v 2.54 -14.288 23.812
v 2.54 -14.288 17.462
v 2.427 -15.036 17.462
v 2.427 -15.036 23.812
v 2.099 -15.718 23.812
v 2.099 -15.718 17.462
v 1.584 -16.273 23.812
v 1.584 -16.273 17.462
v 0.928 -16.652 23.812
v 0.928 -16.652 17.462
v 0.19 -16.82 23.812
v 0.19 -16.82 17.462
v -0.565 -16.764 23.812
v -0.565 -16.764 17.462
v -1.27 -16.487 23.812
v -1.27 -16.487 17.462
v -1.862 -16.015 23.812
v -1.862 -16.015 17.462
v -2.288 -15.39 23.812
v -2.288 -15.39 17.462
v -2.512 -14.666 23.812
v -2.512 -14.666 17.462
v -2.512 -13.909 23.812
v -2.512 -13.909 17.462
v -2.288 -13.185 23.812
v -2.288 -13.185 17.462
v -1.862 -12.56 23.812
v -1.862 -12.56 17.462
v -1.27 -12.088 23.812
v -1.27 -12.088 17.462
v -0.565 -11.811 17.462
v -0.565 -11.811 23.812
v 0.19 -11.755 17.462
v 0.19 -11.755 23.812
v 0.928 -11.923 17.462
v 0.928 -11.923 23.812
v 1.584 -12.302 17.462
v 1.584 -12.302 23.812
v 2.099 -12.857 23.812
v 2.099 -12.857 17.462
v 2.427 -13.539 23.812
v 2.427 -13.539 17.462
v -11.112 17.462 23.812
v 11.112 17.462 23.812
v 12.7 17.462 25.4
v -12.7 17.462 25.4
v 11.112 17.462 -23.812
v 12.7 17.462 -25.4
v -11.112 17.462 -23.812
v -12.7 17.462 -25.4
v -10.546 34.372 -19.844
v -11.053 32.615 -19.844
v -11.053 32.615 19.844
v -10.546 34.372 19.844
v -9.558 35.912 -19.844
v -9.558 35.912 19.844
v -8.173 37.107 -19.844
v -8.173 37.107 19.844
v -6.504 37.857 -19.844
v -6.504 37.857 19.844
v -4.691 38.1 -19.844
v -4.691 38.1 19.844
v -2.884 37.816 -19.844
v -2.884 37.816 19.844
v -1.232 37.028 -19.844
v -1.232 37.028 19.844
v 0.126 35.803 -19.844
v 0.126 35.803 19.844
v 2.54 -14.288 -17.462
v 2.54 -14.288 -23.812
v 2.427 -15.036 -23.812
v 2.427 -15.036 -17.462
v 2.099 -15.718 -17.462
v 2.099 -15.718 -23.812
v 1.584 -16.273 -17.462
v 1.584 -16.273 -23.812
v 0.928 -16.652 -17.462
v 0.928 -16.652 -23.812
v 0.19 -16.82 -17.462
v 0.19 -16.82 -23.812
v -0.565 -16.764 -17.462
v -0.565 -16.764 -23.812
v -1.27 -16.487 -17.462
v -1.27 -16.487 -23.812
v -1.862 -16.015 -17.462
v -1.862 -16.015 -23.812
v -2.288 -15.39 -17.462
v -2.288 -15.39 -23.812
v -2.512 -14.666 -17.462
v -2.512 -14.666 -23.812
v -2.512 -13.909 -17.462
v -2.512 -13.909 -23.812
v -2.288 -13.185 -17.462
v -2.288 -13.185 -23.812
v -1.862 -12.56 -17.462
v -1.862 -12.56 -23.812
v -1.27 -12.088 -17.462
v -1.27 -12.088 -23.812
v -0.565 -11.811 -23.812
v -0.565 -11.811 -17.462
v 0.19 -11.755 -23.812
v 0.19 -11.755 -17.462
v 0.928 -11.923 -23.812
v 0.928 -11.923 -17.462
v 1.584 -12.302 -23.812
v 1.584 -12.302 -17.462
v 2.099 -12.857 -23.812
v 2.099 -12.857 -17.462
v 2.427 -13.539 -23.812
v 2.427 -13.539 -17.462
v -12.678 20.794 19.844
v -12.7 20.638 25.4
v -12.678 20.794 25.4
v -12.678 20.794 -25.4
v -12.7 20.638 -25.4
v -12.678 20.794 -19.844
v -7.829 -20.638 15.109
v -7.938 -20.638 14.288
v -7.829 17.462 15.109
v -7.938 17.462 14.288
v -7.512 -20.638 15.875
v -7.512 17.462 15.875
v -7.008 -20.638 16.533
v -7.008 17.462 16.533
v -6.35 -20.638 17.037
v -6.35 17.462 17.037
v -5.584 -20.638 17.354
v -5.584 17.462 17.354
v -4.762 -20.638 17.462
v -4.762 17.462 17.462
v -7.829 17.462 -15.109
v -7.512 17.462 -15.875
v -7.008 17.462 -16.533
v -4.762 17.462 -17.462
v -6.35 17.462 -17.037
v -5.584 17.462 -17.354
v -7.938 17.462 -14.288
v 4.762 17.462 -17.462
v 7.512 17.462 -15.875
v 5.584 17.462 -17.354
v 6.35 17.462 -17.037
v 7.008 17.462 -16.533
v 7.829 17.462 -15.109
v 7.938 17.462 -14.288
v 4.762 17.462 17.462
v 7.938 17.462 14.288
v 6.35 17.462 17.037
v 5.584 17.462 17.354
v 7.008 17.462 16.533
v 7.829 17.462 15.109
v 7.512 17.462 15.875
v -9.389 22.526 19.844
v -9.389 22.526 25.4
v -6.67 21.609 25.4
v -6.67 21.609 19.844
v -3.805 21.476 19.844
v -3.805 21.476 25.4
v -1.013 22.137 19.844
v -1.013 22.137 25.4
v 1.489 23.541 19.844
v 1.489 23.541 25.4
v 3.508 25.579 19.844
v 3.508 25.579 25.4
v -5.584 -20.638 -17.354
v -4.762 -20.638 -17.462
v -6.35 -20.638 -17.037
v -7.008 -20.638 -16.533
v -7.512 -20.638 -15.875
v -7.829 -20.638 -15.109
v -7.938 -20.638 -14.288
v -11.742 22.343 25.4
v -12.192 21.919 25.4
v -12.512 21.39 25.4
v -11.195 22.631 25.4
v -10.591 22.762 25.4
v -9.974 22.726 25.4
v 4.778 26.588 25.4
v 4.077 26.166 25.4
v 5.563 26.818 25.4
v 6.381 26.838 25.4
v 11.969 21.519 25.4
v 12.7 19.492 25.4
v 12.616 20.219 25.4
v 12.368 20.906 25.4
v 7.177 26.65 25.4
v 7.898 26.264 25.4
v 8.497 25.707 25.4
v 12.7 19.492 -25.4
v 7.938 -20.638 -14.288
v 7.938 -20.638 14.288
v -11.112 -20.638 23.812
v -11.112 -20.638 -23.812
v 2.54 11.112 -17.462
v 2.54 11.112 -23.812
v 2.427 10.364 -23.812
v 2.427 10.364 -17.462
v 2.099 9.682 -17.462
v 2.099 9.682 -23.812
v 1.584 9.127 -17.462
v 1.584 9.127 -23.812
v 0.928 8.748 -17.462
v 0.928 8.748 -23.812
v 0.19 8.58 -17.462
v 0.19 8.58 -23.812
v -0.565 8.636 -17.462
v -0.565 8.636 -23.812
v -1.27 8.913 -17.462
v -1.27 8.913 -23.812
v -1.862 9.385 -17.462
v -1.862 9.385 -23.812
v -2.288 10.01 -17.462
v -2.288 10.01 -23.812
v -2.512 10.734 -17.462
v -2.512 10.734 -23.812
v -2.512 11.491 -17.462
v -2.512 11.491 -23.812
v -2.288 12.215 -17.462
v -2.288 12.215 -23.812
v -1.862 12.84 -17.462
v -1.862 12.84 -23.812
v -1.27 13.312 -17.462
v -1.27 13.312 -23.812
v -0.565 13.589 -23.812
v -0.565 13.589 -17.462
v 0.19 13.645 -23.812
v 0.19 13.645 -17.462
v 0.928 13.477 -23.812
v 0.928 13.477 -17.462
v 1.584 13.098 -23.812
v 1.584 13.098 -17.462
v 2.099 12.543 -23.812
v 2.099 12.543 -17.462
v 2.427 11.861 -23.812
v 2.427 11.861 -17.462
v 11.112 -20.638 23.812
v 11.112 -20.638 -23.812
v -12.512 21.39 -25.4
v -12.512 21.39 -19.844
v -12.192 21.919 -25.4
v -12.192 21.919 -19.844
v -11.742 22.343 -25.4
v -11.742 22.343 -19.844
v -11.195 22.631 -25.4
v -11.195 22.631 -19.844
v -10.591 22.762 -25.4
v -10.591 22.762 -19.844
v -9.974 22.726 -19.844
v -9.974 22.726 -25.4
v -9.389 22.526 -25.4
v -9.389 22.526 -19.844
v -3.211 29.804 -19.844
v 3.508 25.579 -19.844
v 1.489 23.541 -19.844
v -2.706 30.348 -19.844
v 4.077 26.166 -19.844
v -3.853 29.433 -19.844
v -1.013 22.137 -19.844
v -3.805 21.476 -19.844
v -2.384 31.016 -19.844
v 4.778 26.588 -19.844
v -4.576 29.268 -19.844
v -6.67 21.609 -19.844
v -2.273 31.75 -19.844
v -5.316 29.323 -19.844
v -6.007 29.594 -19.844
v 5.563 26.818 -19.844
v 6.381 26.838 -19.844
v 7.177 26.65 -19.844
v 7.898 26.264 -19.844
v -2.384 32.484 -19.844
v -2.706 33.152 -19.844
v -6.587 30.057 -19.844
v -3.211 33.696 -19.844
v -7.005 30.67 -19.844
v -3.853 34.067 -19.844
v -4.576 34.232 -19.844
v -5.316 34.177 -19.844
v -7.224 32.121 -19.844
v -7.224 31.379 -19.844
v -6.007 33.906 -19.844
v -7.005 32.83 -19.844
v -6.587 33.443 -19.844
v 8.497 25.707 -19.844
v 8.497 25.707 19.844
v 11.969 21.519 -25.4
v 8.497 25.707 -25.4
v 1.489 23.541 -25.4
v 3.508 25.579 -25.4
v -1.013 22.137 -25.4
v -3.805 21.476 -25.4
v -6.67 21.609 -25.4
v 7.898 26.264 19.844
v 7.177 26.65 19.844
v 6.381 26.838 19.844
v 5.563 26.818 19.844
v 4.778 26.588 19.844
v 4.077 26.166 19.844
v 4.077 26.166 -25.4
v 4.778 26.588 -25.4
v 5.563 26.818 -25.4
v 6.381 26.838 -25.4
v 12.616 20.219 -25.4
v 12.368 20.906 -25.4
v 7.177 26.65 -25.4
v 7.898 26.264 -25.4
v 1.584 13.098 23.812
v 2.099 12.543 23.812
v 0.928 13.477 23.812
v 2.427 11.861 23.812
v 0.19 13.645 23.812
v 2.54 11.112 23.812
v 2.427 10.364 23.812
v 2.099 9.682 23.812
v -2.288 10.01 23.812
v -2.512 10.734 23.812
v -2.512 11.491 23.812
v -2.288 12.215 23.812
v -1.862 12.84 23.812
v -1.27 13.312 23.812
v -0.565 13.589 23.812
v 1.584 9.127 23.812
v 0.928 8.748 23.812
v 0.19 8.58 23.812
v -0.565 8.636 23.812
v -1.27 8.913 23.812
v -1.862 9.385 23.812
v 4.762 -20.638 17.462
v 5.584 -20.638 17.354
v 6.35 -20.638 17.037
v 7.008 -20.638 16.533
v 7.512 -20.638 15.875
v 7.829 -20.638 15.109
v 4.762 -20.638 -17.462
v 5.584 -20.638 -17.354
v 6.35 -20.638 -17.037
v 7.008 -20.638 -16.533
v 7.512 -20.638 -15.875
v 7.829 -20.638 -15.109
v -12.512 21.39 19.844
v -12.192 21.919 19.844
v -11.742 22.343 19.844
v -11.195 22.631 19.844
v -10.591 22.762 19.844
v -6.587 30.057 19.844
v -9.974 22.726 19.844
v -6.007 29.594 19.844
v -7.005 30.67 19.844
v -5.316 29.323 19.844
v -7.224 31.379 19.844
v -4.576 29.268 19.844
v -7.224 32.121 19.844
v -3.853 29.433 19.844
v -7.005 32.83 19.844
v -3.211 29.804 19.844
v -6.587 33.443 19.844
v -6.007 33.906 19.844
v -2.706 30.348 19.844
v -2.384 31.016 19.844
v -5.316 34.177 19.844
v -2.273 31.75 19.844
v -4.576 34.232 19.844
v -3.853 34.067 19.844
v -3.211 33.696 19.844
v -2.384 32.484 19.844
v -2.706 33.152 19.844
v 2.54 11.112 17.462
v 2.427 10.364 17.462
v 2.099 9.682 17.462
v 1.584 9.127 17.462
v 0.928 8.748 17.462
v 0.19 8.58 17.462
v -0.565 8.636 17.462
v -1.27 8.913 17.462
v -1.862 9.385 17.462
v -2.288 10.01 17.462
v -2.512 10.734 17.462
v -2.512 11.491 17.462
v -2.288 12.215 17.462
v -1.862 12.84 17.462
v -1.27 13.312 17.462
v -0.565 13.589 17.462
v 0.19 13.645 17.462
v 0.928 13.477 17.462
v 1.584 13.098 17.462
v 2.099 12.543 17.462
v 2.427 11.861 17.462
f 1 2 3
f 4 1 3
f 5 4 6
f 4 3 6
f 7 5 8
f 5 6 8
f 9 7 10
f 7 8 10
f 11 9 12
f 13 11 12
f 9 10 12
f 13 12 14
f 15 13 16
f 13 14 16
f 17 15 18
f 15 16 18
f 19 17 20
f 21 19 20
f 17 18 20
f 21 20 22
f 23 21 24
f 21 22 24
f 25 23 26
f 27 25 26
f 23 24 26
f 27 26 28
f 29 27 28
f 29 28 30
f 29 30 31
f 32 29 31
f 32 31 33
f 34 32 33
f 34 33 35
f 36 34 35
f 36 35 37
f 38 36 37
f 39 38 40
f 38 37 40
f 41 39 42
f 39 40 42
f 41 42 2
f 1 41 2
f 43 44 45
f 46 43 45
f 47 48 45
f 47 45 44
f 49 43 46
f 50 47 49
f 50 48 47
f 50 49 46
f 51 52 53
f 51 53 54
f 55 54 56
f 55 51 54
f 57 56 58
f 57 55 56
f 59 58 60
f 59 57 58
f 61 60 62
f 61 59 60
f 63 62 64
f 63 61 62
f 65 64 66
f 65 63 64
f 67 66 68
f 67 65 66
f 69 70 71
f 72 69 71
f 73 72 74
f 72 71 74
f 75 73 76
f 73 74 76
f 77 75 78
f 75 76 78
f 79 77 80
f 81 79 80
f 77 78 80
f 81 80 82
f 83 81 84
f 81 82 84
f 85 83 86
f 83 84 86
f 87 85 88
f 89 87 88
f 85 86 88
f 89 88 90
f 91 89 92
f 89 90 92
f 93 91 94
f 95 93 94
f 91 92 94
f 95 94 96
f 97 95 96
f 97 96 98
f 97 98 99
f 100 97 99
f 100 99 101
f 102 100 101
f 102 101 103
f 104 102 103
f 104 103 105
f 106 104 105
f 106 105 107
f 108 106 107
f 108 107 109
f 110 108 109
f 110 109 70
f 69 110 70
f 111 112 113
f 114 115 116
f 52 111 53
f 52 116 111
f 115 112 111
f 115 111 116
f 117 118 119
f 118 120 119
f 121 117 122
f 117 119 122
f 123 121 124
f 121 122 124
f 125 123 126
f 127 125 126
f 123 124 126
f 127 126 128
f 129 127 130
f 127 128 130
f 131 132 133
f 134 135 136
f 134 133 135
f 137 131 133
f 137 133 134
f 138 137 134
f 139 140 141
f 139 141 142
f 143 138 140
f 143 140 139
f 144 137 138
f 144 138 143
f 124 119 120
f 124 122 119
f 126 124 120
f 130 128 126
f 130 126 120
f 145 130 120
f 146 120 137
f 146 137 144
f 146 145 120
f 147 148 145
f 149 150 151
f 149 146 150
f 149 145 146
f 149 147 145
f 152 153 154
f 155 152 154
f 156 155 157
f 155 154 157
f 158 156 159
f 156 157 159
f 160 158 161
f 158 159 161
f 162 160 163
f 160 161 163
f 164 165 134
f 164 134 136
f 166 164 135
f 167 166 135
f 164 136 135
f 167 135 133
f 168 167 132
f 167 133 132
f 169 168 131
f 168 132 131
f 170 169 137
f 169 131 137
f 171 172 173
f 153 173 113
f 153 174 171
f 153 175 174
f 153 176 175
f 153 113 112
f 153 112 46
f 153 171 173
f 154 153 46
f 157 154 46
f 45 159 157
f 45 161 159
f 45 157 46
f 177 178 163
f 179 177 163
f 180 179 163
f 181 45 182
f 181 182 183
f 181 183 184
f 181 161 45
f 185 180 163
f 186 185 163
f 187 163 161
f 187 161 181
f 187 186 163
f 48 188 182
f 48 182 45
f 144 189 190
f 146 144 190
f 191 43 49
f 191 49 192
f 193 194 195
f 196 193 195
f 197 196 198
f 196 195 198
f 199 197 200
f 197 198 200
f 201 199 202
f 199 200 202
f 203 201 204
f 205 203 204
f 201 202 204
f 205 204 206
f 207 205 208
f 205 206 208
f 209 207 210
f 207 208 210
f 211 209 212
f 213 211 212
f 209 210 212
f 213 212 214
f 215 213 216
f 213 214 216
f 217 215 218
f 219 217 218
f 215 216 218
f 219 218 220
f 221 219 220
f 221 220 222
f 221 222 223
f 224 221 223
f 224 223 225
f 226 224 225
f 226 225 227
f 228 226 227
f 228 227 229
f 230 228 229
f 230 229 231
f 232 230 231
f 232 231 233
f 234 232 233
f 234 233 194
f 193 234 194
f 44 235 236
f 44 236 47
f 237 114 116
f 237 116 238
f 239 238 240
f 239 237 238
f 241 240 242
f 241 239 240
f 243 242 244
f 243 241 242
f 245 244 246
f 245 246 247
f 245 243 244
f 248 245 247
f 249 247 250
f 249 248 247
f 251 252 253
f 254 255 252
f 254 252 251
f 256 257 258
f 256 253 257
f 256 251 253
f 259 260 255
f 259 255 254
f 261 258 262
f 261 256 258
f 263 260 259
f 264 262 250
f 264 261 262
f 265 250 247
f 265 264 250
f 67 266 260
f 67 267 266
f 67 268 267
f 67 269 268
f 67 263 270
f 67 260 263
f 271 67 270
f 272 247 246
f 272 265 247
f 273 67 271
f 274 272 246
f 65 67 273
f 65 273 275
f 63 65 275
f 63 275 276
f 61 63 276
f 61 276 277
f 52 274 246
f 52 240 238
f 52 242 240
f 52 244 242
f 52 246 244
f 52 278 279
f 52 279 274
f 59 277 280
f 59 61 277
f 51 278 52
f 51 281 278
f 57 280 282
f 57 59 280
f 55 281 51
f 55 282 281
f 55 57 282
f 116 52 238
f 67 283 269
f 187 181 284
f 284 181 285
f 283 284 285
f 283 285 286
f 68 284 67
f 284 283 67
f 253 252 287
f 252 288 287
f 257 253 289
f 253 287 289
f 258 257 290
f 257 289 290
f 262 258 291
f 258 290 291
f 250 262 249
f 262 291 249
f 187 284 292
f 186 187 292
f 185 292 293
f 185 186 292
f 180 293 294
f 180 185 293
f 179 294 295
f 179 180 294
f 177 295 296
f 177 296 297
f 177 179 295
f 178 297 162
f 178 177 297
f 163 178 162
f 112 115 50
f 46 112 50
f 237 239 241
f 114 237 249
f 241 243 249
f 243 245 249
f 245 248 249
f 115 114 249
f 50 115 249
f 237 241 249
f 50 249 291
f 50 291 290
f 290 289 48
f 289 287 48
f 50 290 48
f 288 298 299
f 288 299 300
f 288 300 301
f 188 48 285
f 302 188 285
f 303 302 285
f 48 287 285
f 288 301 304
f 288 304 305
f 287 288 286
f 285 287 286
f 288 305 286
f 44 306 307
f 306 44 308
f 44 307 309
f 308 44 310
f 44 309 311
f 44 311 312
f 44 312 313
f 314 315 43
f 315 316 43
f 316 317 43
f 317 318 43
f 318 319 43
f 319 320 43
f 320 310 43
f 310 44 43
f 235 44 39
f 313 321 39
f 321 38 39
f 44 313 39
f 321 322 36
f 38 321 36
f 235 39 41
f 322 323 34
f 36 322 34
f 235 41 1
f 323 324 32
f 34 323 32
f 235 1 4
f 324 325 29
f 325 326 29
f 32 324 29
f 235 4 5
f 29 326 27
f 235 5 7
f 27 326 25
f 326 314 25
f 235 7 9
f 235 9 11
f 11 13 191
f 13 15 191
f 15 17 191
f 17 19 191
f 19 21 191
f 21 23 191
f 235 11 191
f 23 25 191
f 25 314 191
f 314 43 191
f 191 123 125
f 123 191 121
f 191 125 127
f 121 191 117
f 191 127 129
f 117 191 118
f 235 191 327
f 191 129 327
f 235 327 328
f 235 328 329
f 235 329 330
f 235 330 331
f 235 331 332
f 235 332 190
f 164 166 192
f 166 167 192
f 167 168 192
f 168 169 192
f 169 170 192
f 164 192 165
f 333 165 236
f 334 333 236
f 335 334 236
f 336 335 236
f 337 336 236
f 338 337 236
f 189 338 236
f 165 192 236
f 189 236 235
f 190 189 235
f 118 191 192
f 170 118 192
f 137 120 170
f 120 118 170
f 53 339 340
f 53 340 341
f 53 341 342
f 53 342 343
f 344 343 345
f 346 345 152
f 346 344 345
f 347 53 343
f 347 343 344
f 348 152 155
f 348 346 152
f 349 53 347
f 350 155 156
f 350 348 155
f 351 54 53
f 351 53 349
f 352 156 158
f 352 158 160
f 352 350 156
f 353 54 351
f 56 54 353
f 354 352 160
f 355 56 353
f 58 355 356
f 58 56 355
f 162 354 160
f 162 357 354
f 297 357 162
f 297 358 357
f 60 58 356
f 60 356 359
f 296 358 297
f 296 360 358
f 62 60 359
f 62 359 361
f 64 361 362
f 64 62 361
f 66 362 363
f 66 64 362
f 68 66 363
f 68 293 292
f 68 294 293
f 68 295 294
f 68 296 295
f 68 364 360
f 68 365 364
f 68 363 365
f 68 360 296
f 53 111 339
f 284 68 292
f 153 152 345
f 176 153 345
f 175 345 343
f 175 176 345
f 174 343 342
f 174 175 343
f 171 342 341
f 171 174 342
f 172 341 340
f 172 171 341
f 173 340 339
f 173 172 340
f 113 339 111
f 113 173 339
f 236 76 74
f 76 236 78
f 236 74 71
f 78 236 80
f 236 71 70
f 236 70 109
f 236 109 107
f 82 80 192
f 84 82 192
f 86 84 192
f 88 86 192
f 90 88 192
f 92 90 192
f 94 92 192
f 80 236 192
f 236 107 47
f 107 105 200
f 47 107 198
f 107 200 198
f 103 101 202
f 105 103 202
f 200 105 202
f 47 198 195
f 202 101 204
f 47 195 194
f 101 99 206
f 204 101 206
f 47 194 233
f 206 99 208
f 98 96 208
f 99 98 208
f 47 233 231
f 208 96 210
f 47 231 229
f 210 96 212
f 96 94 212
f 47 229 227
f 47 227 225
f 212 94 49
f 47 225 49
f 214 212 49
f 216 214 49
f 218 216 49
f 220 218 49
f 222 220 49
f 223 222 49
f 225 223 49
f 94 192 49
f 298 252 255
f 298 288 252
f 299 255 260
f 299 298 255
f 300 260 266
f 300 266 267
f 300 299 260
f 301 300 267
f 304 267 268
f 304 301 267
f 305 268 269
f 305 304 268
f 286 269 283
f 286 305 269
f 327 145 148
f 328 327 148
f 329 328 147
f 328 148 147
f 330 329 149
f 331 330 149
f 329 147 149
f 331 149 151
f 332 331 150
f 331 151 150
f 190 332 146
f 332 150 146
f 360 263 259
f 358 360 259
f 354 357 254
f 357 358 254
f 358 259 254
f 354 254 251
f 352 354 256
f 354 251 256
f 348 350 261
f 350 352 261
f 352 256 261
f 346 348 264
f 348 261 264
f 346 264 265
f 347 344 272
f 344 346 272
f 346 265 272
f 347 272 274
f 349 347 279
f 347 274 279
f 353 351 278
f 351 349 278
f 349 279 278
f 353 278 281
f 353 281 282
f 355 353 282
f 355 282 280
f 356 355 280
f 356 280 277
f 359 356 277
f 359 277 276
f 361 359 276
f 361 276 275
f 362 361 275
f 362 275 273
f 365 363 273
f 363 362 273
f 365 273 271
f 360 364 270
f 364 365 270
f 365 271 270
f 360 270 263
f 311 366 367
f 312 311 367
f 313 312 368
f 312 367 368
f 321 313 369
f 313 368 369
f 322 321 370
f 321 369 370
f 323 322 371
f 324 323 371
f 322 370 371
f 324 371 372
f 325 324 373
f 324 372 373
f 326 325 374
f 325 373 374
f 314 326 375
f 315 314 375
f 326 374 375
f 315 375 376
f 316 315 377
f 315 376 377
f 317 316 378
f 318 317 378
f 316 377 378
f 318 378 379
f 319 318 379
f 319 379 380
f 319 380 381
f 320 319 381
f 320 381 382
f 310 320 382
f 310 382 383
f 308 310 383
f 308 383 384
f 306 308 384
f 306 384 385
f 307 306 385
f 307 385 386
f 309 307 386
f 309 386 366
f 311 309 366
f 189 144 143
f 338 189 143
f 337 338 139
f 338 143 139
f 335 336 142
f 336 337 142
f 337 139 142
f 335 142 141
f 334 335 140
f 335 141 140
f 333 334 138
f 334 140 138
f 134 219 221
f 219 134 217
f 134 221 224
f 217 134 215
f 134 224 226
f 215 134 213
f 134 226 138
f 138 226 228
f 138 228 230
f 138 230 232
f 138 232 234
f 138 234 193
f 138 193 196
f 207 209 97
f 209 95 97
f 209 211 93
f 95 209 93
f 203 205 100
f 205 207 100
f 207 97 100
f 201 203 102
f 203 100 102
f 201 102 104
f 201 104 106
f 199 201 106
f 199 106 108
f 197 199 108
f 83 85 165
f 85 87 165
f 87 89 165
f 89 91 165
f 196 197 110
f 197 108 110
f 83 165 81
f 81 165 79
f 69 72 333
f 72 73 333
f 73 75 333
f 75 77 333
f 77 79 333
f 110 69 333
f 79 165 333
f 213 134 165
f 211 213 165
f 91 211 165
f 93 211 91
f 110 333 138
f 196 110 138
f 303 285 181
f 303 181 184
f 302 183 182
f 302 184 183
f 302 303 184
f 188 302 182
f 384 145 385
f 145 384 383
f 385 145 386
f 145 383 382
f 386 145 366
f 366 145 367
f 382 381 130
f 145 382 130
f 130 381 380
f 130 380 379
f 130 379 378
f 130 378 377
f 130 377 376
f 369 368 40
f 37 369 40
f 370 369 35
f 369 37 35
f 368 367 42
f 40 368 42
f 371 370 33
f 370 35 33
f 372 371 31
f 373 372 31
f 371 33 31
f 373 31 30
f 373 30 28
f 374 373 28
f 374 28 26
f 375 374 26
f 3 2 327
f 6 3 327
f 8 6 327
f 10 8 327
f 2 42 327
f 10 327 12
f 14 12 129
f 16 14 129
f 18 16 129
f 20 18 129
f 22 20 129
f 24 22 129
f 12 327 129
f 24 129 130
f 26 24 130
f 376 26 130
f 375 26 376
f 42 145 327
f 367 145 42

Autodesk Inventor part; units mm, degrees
ref_plane "YZ Plane" through (0, 0, 0) normal (1, 0, 0) x (0, 1, 0)
ref_plane "XZ Plane" through (0, 0, 0) normal (0, 1, 0) x (-1, 0, 0)
ref_plane "XY Plane" through (0, 0, 0) normal (0, 0, 1) x (1, 0, 0)
sketch "Sketch1" plane through (0, 0, 0) normal (0, 0, 1) x (1, 0, 0)
  line L0 (-12.7, -20.6375) -> (12.7, -20.6375)
  line L1 (12.7, -20.6375) -> (12.7, 20.6375) construction
  line L2 (12.7, 20.6375) -> (-12.7, 20.6375) construction
  line L3 (-12.7, 20.6375) -> (-12.7, -20.6375) construction
  line L4 (-12.7, -20.6375) -> (12.7, 20.6375) construction
  line L5 (12.7, -20.6375) -> (-12.7, 20.6375) construction
  circle A0 centre (0, 11.1125) radius 2.54
  circle A1 centre (0, -1.5875) radius 2.54 construction
  circle A2 centre (0, -14.2875) radius 2.54
  circle A3 centre (-4.7625, 31.75) radius 9.525 construction
  circle A4 centre (-4.7625, 31.75) radius 2.4892
  arc A5 (0.1258, 35.803) -> (-11.0533, 32.6149) centre (-4.7625, 31.75) ccw
  line L6 (-12.7, 20.6375) -> (-11.0533, 32.6149)
  line L7 (12.7, 20.6375) -> (0.1258, 35.803)
  line L8 (-12.7, 20.6375) -> (-11.1125, 20.6375) construction
  line L9 (-11.1125, 20.6375) -> (-11.1125, -20.6375)
  line L10 (11.1125, -20.6375) -> (11.1125, 20.6375)
  line L11 (12.7, 20.6375) -> (11.1125, 20.6375) construction
  line L12 (-12.7, 20.6375) -> (-12.7, 17.4625)
  line L13 (-11.1125, 17.4625) -> (-12.7, 17.4625)
  line L14 (12.7, 20.6375) -> (12.7, 17.4625)
  line L15 (12.7, 17.4625) -> (11.1125, 17.4625)
  point P0 (0, 0)
  point P1 (0, 0)
  dimension "d0" = 25.4
  dimension "d2" = 5.08
  dimension "d3" = 9.525
  dimension "d6" = 12.7
  dimension "d11" = 6.35
  dimension "d12" = 19.05
  dimension "d13" = 4.9784
  dimension "d14" = 11.1125
  dimension "d15" = 4.7625
  dimension "d27" = 1.5875
  dimension "d28" = 1.5875
  dimension "d32" = 3.175
  dimension "d45" = 12.7
extrude "Extrusion1" add sketch "Sketch1" along normal mid plane 50.8
sketch "Sketch3" plane through (-11.1125, -20.6375, 25.4) normal (-1, 0, 0) x (0, 0, 1)
  line L0 (-50.8, 0) -> (0, 0) projected
  line L1 (0, 38.1) -> (0, 0) projected
  line L2 (-50.8, 0) -> (-50.8, 38.1) projected
  line L3 (-49.2125, 41.275) -> (-1.5875, 41.275)
  line L4 (-1.5875, 41.275) -> (-1.5875, 0)
  line L5 (-1.5875, 0) -> (-49.2125, 0)
  line L6 (-49.2125, 0) -> (-49.2125, 41.275)
  line L7 (-49.2125, 41.275) -> (-1.5875, 0) construction
  line L8 (-1.5875, 41.275) -> (-49.2125, 0) construction
  line L9 (-50.8, 38.1) -> (0, 38.1) projected
  point P0 (-25.4, 20.6375)
  point P1 (-49.2125, 38.1)
  point P2 (-1.5875, 38.1)
  dimension "d29" = 1.5875
extrude "Extrusion3" cut sketch "Sketch3" against normal through all contours L2 L9 L6 L0 | L4 L9 L1 L0
sketch "Sketch2" plane through (0, 0, 25.4) normal (0, 0, 1) x (1, 0, 0)
  circle A0 centre (-4.7625, 31.75) radius 2.4892 projected
  circle A1 centre (-4.7625, 31.75) radius 10.3188
  point P0 (0, 0)
  dimension "d19" = 20.6375
extrude "Extrusion2" cut sketch "Sketch2" against normal blind 5.5563
mirror "Mirror1" about plane through (0, 0, 0) normal (0, 0, 1) of "Extrusion2"
fillet "Fillet1" radius 3.175 3 edges at (5.3172, 29.5418, 22.6219) (5.3172, 29.5418, -22.6219) (12.7, 20.6375, 0)
fillet "Fillet1" radius 2.286 2 edges at (-12.1611, 24.5572, -22.6219) (-12.1611, 24.5572, 22.6219)
thread "Thread1" size "1/4-20 UNC" class "2B" standard "ANSI Unified Screw Threads" length 19.05
thread "Thread2" size "1/4-20 UNC" class "2B" standard "ANSI Unified Screw Threads" length 19.05
thread "Thread3" size "1/4-20 UNC" class "2B" standard "ANSI Unified Screw Threads" length 19.05
thread "Thread4" size "1/4-20 UNC" class "2B" standard "ANSI Unified Screw Threads" length 19.05
sketch "Sketch4" plane through (-11.1125, -20.6375, -23.8125) normal (0, -1, 0) x (1, 0, 0)
  line L0 (0, 0) -> (22.225, 0) projected
  line L1 (22.225, 0) -> (22.225, 47.625) projected
  line L2 (22.225, 47.625) -> (0, 47.625) projected
  line L3 (0, 0) -> (0, 47.625) projected
  line L4 (19.05, 41.275) -> (3.175, 41.275)
  line L5 (3.175, 41.275) -> (3.175, 6.35)
  line L6 (3.175, 6.35) -> (19.05, 6.35)
  line L7 (19.05, 6.35) -> (19.05, 41.275)
  point P0 (11.1125, 23.8125)
  dimension "d37" = 3.175
  dimension "d38" = 3.175
  dimension "d39" = 6.35
  dimension "d40" = 6.35
extrude "Extrusion4" cut sketch "Sketch4" against normal up to surface (38.1 mm away) contours L7 L6 L5 L4
fillet "Fillet2" radius 3.175 4 edges at (-7.9375, -1.5875, 17.4625) (7.9375, -1.5875, 17.4625) (7.9375, -1.5875, -17.4625) (-7.9375, -1.5875, -17.4625)
equation "\"d28\" = d27"
equation "\"d38\" = d37"
equation "\"d40\" = d39"
properties part number "F4C9-200-001 Top Bearing Block" material "Aluminum 6061"
